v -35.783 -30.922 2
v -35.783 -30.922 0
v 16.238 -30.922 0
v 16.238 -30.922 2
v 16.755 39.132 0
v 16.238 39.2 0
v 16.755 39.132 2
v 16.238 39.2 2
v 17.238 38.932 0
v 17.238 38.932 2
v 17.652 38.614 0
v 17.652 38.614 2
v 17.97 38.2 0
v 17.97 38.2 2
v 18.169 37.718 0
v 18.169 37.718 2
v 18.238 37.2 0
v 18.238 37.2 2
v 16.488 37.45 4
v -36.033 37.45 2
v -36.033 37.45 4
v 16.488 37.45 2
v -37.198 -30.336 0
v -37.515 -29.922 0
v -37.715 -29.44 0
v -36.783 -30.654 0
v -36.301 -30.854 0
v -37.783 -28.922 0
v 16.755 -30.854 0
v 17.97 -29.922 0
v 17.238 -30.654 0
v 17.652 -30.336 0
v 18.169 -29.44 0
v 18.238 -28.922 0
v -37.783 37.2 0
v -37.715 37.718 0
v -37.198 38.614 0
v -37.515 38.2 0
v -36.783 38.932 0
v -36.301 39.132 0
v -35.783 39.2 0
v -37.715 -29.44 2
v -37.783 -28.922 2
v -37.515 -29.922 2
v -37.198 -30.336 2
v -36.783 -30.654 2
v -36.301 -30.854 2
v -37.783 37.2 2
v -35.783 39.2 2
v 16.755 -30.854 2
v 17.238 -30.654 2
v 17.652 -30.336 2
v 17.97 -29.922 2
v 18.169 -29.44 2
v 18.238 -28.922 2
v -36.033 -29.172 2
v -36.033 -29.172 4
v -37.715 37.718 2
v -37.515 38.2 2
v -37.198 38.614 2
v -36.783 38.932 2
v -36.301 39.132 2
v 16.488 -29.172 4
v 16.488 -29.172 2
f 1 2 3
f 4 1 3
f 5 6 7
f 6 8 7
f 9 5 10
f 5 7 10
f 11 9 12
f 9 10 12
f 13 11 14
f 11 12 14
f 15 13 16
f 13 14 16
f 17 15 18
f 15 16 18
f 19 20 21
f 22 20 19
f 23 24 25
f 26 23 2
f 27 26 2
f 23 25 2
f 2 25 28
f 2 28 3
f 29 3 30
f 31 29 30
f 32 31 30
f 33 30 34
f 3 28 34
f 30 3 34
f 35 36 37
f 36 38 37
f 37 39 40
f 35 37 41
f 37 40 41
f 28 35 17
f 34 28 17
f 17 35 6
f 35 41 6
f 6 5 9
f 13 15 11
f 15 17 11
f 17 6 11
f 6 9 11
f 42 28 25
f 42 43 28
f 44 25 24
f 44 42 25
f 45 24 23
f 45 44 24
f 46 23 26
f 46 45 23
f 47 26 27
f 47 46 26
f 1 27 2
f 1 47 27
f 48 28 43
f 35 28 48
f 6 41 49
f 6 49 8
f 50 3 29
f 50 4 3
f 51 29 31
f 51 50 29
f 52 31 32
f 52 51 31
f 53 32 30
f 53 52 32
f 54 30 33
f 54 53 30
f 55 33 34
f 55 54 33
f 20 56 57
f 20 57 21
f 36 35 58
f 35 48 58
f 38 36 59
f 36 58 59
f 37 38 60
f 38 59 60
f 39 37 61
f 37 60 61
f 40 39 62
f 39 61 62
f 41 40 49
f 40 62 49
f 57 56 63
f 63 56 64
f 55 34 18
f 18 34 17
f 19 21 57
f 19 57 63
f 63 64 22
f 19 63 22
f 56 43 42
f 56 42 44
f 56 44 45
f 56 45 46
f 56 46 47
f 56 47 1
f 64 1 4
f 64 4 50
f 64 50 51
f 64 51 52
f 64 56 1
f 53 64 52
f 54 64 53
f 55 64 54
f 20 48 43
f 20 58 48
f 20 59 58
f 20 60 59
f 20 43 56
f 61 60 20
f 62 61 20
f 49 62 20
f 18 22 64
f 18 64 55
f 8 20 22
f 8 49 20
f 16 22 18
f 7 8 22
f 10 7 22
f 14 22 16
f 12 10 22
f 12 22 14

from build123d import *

# Parameters (mm, degrees)
F0_W     = 56.021
F0_H     = 70.122
F0_W_2   = 52.521
F0_H_2   = 66.622
F1_DEPTH = 2
F2_R     = 2
F3_DEPTH = 4


with BuildPart() as f1:
    # F0 (on Top) → F1 (new body)
    with BuildSketch(Plane.XY):
        with Locations((-9.772905, 4.139024)):
            Rectangle(F0_W, F0_H)
        with Locations((-9.772905, 4.139024)):
            Rectangle(F0_W_2, F0_H_2, mode=Mode.SUBTRACT)
    extrude(amount=F1_DEPTH)

    # F2
    f2_edges = [f1.edges().sort_by_distance(p)[0] for p in [
        (-37.783405, -30.921976, 1),
        (-37.783405, 39.200024, 1),
        (18.237595, 39.200024, 1),
        (18.237595, -30.921976, 1),
    ]]
    fillet(f2_edges, radius=F2_R)

    # F0 (on Top) → F3 (join)
    with BuildSketch(Plane.XY):
        with Locations((-9.772905, 4.139024)):
            Rectangle(F0_W_2, F0_H_2)
    extrude(amount=F3_DEPTH)


solid = f1.part
